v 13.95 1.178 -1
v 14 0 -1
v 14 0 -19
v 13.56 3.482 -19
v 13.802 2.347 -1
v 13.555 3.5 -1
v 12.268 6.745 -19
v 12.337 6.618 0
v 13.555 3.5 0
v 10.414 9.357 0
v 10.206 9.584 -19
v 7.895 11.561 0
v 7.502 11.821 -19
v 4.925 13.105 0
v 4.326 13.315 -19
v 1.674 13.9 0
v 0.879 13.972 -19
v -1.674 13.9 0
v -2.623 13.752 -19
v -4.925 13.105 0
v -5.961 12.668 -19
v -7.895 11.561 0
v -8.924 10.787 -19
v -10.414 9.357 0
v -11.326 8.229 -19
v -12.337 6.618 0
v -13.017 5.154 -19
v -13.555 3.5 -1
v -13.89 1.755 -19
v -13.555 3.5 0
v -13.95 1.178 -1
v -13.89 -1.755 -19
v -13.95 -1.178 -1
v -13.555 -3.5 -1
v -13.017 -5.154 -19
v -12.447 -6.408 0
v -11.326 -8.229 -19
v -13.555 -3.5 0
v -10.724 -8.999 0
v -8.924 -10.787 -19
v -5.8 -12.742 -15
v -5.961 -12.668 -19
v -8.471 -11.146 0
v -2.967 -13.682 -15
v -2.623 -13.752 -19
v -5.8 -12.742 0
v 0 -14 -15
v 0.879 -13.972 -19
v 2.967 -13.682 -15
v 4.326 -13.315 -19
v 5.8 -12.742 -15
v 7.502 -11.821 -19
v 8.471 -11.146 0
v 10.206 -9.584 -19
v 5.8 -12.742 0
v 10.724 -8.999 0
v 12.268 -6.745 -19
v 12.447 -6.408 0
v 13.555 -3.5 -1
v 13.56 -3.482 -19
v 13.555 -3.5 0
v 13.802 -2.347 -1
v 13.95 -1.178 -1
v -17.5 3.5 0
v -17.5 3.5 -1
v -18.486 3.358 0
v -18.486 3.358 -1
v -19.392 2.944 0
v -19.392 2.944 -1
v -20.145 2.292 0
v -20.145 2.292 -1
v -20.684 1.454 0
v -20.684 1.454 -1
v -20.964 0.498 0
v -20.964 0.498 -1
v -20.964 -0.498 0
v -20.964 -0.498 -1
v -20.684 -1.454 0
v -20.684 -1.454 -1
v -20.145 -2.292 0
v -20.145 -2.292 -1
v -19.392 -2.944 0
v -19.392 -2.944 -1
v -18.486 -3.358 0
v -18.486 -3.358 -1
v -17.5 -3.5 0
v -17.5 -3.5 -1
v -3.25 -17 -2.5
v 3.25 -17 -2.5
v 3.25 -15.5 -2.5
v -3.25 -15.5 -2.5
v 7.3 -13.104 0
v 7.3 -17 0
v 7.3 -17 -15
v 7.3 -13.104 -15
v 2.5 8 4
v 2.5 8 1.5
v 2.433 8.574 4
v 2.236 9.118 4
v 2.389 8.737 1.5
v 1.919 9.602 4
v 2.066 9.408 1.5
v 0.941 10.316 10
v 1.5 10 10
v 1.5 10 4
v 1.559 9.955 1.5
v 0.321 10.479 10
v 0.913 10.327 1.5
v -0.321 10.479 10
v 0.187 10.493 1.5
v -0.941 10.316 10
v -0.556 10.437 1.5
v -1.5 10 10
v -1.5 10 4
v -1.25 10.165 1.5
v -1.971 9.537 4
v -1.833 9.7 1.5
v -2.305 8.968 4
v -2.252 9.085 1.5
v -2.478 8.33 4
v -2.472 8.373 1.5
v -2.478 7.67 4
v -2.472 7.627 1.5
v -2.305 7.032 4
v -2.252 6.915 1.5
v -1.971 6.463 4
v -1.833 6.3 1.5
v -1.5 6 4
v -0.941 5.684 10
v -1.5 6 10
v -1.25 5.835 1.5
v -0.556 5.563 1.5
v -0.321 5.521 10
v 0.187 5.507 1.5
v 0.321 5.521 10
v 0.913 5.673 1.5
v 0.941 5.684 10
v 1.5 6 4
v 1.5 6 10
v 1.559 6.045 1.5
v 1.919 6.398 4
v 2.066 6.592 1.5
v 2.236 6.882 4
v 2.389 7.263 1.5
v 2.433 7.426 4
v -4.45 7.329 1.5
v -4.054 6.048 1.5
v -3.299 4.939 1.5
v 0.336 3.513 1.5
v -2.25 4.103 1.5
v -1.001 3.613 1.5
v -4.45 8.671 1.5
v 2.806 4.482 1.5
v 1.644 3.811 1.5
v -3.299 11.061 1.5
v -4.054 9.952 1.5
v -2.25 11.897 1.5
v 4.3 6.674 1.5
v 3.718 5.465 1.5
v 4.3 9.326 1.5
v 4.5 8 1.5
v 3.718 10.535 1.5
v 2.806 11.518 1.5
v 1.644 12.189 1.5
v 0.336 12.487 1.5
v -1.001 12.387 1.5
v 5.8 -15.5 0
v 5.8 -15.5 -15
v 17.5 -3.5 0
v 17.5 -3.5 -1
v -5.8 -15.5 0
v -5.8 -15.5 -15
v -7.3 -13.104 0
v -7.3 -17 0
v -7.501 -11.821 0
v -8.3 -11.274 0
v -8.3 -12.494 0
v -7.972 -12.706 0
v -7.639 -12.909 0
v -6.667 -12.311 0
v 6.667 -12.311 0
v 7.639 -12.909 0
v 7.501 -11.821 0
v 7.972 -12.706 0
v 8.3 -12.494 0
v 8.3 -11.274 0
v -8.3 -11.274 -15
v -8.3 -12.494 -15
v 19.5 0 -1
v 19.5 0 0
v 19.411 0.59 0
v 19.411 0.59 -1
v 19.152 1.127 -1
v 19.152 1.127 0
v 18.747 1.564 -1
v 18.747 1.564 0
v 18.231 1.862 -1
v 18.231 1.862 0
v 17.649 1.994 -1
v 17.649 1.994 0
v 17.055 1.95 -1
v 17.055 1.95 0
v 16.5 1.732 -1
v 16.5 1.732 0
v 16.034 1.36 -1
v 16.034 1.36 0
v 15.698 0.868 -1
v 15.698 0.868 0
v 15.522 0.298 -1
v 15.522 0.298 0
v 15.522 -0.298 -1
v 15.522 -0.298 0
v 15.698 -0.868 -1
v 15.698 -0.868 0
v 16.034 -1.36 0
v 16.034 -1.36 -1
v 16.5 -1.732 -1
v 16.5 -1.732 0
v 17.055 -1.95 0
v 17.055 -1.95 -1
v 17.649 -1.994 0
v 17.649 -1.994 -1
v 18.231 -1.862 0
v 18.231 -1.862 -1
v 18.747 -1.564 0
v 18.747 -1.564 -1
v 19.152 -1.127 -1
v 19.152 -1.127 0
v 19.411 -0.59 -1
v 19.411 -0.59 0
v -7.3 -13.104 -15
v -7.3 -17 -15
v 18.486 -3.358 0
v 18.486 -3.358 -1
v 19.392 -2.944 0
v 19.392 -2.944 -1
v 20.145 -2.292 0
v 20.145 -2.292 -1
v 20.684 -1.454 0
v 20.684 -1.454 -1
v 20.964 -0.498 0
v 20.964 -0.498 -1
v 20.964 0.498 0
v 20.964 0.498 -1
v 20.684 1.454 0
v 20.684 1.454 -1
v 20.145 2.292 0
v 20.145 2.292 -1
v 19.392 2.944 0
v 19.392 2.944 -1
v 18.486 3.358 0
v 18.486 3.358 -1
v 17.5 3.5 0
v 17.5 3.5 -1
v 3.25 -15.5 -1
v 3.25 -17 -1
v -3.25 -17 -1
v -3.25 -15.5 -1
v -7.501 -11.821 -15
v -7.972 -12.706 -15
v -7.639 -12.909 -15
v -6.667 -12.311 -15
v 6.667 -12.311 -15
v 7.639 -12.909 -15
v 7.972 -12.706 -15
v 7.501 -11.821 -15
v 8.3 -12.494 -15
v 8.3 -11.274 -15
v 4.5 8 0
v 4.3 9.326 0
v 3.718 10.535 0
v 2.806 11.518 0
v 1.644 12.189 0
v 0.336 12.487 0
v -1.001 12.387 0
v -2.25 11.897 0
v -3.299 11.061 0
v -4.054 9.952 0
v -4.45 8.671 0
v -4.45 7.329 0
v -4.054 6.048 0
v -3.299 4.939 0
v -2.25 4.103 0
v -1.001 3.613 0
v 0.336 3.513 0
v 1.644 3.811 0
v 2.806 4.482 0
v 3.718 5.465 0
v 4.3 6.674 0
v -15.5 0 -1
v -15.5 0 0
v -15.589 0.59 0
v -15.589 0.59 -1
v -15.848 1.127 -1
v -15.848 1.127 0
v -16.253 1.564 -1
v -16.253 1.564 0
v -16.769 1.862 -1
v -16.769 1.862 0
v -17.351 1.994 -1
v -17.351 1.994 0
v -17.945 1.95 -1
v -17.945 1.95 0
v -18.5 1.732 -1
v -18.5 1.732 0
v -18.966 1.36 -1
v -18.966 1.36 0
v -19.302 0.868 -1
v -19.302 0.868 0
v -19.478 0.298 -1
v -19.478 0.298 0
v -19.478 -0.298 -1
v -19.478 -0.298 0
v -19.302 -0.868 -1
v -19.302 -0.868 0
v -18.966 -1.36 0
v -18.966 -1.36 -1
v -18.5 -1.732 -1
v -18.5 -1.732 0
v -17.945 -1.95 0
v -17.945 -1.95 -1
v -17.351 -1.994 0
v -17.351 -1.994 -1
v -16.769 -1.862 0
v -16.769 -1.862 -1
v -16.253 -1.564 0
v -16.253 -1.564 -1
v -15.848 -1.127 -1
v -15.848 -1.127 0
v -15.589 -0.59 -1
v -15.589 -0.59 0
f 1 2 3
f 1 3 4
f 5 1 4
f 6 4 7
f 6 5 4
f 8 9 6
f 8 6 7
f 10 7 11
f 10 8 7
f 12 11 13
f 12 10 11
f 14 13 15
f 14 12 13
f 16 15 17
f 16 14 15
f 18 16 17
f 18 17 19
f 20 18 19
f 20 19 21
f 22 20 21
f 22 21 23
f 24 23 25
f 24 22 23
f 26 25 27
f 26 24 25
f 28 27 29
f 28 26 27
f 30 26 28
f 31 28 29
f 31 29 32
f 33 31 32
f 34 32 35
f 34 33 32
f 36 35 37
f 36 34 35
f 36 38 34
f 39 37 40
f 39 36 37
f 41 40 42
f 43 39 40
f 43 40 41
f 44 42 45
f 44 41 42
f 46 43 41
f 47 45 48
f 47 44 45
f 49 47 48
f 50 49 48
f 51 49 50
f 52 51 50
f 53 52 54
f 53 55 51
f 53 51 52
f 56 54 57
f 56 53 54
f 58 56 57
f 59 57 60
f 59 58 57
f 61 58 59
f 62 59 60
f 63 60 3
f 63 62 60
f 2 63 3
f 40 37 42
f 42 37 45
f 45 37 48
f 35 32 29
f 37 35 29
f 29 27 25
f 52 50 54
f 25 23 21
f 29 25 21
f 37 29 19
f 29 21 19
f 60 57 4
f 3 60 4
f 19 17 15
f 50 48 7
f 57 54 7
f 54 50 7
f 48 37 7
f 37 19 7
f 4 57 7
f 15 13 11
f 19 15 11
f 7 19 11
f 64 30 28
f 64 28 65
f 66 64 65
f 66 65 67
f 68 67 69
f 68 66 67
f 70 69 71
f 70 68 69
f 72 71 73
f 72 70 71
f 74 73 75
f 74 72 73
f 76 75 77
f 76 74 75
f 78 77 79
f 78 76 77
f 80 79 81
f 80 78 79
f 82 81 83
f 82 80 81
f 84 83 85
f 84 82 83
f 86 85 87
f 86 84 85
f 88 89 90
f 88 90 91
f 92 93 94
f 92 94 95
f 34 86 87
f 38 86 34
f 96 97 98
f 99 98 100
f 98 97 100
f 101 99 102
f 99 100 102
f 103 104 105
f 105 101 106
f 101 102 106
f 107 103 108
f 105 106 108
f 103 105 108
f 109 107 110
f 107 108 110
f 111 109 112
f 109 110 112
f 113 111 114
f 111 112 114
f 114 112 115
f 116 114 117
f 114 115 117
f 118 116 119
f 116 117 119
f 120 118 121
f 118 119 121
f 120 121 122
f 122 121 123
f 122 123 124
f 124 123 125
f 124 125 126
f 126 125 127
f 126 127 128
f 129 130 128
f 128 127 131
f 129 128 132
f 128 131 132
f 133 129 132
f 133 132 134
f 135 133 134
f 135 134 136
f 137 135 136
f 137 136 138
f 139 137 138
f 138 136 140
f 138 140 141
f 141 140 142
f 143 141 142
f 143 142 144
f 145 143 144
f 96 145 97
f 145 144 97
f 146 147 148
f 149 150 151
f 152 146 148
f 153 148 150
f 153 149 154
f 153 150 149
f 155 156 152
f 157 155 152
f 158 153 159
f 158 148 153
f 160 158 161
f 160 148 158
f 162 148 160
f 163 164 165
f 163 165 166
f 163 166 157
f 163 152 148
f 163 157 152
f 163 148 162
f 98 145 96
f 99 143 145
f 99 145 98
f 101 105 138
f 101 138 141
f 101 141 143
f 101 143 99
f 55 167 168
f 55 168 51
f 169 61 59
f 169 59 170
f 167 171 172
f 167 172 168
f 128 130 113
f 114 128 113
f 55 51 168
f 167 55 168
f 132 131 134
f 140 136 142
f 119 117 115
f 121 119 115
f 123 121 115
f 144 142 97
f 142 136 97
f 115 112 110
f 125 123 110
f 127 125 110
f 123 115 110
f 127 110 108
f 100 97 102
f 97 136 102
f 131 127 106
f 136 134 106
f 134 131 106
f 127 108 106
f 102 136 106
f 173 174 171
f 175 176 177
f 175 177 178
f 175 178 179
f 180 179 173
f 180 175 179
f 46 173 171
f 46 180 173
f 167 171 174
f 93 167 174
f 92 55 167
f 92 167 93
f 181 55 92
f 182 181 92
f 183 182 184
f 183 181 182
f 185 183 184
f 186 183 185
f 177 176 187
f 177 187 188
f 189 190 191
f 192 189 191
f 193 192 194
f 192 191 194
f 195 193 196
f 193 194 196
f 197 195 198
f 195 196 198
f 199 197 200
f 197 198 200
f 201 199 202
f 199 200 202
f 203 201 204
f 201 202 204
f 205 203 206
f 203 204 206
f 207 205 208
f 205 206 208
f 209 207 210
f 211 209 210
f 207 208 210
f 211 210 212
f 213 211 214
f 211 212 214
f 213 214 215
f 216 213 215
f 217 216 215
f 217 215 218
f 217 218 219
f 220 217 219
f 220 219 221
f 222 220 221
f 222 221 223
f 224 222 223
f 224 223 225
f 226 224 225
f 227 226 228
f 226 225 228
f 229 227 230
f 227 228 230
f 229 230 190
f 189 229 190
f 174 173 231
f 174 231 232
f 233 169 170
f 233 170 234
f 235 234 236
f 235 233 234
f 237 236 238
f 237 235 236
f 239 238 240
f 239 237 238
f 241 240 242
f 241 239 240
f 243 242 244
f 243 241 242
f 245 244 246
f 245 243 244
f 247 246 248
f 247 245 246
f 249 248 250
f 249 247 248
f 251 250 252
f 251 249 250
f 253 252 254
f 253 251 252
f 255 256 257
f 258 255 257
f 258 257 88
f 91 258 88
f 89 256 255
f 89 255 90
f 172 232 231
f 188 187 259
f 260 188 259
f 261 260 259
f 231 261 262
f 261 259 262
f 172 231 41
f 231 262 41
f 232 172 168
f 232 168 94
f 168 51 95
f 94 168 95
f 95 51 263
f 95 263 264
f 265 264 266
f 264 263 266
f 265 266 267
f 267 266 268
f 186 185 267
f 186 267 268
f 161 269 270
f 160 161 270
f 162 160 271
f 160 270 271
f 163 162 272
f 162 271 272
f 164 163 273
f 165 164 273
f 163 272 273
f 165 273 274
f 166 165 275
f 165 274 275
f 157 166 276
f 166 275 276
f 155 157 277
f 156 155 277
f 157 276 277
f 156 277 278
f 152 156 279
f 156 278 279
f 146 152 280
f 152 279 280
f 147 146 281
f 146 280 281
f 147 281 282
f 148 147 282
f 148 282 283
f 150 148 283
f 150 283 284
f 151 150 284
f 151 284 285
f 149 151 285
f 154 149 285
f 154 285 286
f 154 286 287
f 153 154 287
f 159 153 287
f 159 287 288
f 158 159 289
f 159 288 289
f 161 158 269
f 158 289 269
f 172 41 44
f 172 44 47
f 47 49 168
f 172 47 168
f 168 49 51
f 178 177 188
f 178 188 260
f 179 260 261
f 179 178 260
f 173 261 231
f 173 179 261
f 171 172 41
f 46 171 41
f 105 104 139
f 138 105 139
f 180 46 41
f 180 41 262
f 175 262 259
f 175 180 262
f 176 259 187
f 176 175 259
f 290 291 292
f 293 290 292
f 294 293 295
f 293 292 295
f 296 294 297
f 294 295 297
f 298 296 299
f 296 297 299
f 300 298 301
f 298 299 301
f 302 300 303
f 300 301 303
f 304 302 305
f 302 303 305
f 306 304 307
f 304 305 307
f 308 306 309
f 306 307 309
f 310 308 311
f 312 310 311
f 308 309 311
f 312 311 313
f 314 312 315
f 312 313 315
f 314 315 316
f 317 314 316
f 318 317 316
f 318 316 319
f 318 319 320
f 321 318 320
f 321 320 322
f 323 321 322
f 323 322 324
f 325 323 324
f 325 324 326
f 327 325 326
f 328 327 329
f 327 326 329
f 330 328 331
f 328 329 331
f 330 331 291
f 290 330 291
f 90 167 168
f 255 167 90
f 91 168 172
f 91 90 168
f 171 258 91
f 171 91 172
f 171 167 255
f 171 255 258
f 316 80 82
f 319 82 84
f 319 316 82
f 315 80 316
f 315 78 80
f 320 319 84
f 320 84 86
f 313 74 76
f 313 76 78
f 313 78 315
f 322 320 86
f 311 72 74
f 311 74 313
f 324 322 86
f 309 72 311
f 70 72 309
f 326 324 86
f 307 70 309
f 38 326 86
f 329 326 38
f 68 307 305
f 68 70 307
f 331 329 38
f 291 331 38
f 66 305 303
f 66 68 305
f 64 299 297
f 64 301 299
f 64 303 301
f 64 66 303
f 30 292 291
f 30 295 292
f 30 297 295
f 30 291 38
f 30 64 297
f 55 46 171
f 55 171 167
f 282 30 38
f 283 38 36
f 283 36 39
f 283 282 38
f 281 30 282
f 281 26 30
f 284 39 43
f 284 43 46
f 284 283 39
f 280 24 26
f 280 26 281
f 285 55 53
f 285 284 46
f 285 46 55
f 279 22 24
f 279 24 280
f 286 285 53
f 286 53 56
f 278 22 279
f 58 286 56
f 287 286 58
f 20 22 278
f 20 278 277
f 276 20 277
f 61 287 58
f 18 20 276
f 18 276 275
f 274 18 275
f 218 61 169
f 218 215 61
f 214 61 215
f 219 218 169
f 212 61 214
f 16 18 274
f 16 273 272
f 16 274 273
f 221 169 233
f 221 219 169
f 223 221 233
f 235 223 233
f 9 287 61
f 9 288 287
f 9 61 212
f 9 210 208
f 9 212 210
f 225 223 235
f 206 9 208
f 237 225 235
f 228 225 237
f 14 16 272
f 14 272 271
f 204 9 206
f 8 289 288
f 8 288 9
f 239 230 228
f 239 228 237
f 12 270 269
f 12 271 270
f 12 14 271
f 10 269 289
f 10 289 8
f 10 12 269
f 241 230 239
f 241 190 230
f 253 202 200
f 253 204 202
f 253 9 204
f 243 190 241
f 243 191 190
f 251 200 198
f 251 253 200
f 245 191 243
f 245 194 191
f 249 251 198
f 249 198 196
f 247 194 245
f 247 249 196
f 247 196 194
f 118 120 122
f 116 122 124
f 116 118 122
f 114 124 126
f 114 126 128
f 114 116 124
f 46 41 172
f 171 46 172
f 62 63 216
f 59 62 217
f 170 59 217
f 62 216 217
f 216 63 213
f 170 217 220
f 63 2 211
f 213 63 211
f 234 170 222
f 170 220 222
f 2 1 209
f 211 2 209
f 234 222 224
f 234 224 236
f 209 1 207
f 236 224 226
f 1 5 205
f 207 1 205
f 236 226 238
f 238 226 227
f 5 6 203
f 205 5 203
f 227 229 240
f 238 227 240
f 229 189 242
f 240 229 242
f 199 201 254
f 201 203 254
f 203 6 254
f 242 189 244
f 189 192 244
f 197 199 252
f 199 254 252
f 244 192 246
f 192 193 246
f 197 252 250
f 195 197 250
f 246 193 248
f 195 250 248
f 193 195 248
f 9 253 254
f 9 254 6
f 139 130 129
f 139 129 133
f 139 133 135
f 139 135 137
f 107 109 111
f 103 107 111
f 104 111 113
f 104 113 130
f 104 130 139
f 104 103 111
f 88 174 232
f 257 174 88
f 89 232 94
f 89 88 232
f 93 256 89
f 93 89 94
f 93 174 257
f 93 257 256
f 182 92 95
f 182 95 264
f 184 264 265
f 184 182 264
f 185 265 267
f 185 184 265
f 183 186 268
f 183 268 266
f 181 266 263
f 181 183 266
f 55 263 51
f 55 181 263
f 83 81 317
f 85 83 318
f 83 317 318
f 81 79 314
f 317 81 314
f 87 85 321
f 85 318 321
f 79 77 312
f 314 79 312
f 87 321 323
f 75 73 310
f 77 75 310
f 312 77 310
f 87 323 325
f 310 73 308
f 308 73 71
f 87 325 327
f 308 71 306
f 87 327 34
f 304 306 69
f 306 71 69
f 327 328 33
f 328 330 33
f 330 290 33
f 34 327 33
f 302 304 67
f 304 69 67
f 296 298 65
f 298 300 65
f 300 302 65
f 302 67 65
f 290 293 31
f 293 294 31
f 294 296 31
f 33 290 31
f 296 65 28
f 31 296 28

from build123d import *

# Parameters (mm, degrees)
SKETCH1_R           = 14
BOSS_EXTRUDE1_DEPTH = 19
SKETCH2_R           = 2
BOSS_EXTRUDE2_DEPTH = 1
SKETCH3_R           = 4.5
BOSS_EXTRUDE3_DEPTH = 1.5
SKETCH4_R           = 2.5
BOSS_EXTRUDE4_DEPTH = 8.5
CUT_EXTRUDE1_DEPTH  = 6
BOSS_EXTRUDE6_DEPTH = 15
BOSS_EXTRUDE7_DEPTH = 15
SKETCH10_W          = 6.5
SKETCH10_H          = 1.5
CUT_EXTRUDE2_DEPTH  = 1.5


with BuildPart() as part:
    # Sketch1 → Boss-Extrude1 (new body)
    with BuildSketch(Plane.XY):
        Circle(SKETCH1_R)
    extrude(amount=-BOSS_EXTRUDE1_DEPTH)

    # Sketch2 → Boss-Extrude2 (add)
    # profile 1 of 2: a face of its own
    with BuildSketch(Plane.XY):
        with BuildLine():
            Line((-13.555441712, 3.5), (-17.5, 3.5))
            ThreePointArc((-17.5, 3.5), (-21, 0), (-17.5, -3.5))
            Line((-17.5, -3.5), (-13.555441712, -3.5))
            ThreePointArc((-13.555441712, -3.5), (-14, 0), (-13.555441712, 3.5))
        make_face()
        with Locations((-17.5, 0)):
            Circle(SKETCH2_R, mode=Mode.SUBTRACT)
    # profile 2 of 2: a face of its own
    with BuildSketch(Plane.XY):
        with BuildLine():
            Line((17.5, 3.5), (13.555441712, 3.5))
            ThreePointArc((13.555441712, 3.5), (13.888415748, 1.764060095), (14, 0))
            ThreePointArc((14, 0), (13.888415748, -1.764060095), (13.555441712, -3.5))
            Line((13.555441712, -3.5), (17.5, -3.5))
            ThreePointArc((17.5, -3.5), (21, 0), (17.5, 3.5))
        make_face()
        with Locations((17.5, 0)):
            Circle(SKETCH2_R, mode=Mode.SUBTRACT)
    extrude(amount=-BOSS_EXTRUDE2_DEPTH)

    # Sketch3 → Boss-Extrude3 (add)
    with BuildSketch(Plane.XY):
        with Locations((0, 8)):
            Circle(SKETCH3_R)
    extrude(amount=BOSS_EXTRUDE3_DEPTH)

    # Sketch9 → Boss-Extrude7 (add)
    with BuildSketch(Plane.XY):
        with BuildLine():
            Line((5.8, -15.5), (5.8, -12.742056349))
            ThreePointArc((5.8, -12.742056349), (0, -14), (-5.8, -12.742056349))
            Line((-5.8, -12.742056349), (-5.8, -15.5))
            Line((-5.8, -15.5), (5.8, -15.5))
        make_face()
    extrude(amount=-BOSS_EXTRUDE7_DEPTH)


with BuildPart() as body_2:
    # Sketch4 → Boss-Extrude4 (new body)
    with BuildSketch(Plane.XY.offset(1.5)):
        with Locations((0, 8)):
            Circle(SKETCH4_R)
    extrude(amount=BOSS_EXTRUDE4_DEPTH)

    # Sketch5 → Cut-Extrude1 (cut)
    with BuildSketch(Plane.XY.offset(10)):
        with BuildLine():
            Line((-1.5, 6), (-1.5, 10))
            ThreePointArc((-1.5, 10), (-2.5, 8), (-1.5, 6))
        make_face()
        with BuildLine():
            ThreePointArc((2.5, 8), (2.236067977, 9.118033989), (1.5, 10))
            Line((1.5, 10), (1.5, 6))
            ThreePointArc((1.5, 6), (2.236067977, 6.881966011), (2.5, 8))
        make_face()
    extrude(amount=-CUT_EXTRUDE1_DEPTH, mode=Mode.SUBTRACT)


with BuildPart() as body_3:
    # Sketch6 → Boss-Extrude6 (new body)
    with BuildSketch(Plane.XY):
        with BuildLine():
            Line((-7.3, -13.103816238), (-7.3, -17))
            Line((-7.3, -17), (7.3, -17))
            Line((7.3, -17), (7.3, -13.103816238))
            ThreePointArc((7.3, -13.103816238), (7.805949489, -12.808870074), (8.3, -12.494398745))
            Line((8.3, -12.494398745), (8.3, -11.274307074))
            ThreePointArc((8.3, -11.274307074), (7.088093678, -12.073066223), (5.8, -12.742056349))
            Line((5.8, -12.742056349), (5.8, -15.5))
            Line((5.8, -15.5), (-5.8, -15.5))
            Line((-5.8, -15.5), (-5.8, -12.742056349))
            ThreePointArc((-5.8, -12.742056349), (-7.088093678, -12.073066223), (-8.3, -11.274307074))
            Line((-8.3, -11.274307074), (-8.3, -12.494398745))
            ThreePointArc((-8.3, -12.494398745), (-7.805949489, -12.808870074), (-7.3, -13.103816238))
        make_face()
    extrude(amount=-BOSS_EXTRUDE6_DEPTH)

    # Sketch10 → Cut-Extrude2 (cut)
    with BuildSketch(Plane(origin=(0, -17, 0), x_dir=(-1, 0, 0), z_dir=(0, -1, 0))):
        with Locations((0, 1.75)):
            Rectangle(SKETCH10_W, SKETCH10_H)
    extrude(amount=-CUT_EXTRUDE2_DEPTH, mode=Mode.SUBTRACT)


solid = Compound([part.part, body_2.part, body_3.part])
